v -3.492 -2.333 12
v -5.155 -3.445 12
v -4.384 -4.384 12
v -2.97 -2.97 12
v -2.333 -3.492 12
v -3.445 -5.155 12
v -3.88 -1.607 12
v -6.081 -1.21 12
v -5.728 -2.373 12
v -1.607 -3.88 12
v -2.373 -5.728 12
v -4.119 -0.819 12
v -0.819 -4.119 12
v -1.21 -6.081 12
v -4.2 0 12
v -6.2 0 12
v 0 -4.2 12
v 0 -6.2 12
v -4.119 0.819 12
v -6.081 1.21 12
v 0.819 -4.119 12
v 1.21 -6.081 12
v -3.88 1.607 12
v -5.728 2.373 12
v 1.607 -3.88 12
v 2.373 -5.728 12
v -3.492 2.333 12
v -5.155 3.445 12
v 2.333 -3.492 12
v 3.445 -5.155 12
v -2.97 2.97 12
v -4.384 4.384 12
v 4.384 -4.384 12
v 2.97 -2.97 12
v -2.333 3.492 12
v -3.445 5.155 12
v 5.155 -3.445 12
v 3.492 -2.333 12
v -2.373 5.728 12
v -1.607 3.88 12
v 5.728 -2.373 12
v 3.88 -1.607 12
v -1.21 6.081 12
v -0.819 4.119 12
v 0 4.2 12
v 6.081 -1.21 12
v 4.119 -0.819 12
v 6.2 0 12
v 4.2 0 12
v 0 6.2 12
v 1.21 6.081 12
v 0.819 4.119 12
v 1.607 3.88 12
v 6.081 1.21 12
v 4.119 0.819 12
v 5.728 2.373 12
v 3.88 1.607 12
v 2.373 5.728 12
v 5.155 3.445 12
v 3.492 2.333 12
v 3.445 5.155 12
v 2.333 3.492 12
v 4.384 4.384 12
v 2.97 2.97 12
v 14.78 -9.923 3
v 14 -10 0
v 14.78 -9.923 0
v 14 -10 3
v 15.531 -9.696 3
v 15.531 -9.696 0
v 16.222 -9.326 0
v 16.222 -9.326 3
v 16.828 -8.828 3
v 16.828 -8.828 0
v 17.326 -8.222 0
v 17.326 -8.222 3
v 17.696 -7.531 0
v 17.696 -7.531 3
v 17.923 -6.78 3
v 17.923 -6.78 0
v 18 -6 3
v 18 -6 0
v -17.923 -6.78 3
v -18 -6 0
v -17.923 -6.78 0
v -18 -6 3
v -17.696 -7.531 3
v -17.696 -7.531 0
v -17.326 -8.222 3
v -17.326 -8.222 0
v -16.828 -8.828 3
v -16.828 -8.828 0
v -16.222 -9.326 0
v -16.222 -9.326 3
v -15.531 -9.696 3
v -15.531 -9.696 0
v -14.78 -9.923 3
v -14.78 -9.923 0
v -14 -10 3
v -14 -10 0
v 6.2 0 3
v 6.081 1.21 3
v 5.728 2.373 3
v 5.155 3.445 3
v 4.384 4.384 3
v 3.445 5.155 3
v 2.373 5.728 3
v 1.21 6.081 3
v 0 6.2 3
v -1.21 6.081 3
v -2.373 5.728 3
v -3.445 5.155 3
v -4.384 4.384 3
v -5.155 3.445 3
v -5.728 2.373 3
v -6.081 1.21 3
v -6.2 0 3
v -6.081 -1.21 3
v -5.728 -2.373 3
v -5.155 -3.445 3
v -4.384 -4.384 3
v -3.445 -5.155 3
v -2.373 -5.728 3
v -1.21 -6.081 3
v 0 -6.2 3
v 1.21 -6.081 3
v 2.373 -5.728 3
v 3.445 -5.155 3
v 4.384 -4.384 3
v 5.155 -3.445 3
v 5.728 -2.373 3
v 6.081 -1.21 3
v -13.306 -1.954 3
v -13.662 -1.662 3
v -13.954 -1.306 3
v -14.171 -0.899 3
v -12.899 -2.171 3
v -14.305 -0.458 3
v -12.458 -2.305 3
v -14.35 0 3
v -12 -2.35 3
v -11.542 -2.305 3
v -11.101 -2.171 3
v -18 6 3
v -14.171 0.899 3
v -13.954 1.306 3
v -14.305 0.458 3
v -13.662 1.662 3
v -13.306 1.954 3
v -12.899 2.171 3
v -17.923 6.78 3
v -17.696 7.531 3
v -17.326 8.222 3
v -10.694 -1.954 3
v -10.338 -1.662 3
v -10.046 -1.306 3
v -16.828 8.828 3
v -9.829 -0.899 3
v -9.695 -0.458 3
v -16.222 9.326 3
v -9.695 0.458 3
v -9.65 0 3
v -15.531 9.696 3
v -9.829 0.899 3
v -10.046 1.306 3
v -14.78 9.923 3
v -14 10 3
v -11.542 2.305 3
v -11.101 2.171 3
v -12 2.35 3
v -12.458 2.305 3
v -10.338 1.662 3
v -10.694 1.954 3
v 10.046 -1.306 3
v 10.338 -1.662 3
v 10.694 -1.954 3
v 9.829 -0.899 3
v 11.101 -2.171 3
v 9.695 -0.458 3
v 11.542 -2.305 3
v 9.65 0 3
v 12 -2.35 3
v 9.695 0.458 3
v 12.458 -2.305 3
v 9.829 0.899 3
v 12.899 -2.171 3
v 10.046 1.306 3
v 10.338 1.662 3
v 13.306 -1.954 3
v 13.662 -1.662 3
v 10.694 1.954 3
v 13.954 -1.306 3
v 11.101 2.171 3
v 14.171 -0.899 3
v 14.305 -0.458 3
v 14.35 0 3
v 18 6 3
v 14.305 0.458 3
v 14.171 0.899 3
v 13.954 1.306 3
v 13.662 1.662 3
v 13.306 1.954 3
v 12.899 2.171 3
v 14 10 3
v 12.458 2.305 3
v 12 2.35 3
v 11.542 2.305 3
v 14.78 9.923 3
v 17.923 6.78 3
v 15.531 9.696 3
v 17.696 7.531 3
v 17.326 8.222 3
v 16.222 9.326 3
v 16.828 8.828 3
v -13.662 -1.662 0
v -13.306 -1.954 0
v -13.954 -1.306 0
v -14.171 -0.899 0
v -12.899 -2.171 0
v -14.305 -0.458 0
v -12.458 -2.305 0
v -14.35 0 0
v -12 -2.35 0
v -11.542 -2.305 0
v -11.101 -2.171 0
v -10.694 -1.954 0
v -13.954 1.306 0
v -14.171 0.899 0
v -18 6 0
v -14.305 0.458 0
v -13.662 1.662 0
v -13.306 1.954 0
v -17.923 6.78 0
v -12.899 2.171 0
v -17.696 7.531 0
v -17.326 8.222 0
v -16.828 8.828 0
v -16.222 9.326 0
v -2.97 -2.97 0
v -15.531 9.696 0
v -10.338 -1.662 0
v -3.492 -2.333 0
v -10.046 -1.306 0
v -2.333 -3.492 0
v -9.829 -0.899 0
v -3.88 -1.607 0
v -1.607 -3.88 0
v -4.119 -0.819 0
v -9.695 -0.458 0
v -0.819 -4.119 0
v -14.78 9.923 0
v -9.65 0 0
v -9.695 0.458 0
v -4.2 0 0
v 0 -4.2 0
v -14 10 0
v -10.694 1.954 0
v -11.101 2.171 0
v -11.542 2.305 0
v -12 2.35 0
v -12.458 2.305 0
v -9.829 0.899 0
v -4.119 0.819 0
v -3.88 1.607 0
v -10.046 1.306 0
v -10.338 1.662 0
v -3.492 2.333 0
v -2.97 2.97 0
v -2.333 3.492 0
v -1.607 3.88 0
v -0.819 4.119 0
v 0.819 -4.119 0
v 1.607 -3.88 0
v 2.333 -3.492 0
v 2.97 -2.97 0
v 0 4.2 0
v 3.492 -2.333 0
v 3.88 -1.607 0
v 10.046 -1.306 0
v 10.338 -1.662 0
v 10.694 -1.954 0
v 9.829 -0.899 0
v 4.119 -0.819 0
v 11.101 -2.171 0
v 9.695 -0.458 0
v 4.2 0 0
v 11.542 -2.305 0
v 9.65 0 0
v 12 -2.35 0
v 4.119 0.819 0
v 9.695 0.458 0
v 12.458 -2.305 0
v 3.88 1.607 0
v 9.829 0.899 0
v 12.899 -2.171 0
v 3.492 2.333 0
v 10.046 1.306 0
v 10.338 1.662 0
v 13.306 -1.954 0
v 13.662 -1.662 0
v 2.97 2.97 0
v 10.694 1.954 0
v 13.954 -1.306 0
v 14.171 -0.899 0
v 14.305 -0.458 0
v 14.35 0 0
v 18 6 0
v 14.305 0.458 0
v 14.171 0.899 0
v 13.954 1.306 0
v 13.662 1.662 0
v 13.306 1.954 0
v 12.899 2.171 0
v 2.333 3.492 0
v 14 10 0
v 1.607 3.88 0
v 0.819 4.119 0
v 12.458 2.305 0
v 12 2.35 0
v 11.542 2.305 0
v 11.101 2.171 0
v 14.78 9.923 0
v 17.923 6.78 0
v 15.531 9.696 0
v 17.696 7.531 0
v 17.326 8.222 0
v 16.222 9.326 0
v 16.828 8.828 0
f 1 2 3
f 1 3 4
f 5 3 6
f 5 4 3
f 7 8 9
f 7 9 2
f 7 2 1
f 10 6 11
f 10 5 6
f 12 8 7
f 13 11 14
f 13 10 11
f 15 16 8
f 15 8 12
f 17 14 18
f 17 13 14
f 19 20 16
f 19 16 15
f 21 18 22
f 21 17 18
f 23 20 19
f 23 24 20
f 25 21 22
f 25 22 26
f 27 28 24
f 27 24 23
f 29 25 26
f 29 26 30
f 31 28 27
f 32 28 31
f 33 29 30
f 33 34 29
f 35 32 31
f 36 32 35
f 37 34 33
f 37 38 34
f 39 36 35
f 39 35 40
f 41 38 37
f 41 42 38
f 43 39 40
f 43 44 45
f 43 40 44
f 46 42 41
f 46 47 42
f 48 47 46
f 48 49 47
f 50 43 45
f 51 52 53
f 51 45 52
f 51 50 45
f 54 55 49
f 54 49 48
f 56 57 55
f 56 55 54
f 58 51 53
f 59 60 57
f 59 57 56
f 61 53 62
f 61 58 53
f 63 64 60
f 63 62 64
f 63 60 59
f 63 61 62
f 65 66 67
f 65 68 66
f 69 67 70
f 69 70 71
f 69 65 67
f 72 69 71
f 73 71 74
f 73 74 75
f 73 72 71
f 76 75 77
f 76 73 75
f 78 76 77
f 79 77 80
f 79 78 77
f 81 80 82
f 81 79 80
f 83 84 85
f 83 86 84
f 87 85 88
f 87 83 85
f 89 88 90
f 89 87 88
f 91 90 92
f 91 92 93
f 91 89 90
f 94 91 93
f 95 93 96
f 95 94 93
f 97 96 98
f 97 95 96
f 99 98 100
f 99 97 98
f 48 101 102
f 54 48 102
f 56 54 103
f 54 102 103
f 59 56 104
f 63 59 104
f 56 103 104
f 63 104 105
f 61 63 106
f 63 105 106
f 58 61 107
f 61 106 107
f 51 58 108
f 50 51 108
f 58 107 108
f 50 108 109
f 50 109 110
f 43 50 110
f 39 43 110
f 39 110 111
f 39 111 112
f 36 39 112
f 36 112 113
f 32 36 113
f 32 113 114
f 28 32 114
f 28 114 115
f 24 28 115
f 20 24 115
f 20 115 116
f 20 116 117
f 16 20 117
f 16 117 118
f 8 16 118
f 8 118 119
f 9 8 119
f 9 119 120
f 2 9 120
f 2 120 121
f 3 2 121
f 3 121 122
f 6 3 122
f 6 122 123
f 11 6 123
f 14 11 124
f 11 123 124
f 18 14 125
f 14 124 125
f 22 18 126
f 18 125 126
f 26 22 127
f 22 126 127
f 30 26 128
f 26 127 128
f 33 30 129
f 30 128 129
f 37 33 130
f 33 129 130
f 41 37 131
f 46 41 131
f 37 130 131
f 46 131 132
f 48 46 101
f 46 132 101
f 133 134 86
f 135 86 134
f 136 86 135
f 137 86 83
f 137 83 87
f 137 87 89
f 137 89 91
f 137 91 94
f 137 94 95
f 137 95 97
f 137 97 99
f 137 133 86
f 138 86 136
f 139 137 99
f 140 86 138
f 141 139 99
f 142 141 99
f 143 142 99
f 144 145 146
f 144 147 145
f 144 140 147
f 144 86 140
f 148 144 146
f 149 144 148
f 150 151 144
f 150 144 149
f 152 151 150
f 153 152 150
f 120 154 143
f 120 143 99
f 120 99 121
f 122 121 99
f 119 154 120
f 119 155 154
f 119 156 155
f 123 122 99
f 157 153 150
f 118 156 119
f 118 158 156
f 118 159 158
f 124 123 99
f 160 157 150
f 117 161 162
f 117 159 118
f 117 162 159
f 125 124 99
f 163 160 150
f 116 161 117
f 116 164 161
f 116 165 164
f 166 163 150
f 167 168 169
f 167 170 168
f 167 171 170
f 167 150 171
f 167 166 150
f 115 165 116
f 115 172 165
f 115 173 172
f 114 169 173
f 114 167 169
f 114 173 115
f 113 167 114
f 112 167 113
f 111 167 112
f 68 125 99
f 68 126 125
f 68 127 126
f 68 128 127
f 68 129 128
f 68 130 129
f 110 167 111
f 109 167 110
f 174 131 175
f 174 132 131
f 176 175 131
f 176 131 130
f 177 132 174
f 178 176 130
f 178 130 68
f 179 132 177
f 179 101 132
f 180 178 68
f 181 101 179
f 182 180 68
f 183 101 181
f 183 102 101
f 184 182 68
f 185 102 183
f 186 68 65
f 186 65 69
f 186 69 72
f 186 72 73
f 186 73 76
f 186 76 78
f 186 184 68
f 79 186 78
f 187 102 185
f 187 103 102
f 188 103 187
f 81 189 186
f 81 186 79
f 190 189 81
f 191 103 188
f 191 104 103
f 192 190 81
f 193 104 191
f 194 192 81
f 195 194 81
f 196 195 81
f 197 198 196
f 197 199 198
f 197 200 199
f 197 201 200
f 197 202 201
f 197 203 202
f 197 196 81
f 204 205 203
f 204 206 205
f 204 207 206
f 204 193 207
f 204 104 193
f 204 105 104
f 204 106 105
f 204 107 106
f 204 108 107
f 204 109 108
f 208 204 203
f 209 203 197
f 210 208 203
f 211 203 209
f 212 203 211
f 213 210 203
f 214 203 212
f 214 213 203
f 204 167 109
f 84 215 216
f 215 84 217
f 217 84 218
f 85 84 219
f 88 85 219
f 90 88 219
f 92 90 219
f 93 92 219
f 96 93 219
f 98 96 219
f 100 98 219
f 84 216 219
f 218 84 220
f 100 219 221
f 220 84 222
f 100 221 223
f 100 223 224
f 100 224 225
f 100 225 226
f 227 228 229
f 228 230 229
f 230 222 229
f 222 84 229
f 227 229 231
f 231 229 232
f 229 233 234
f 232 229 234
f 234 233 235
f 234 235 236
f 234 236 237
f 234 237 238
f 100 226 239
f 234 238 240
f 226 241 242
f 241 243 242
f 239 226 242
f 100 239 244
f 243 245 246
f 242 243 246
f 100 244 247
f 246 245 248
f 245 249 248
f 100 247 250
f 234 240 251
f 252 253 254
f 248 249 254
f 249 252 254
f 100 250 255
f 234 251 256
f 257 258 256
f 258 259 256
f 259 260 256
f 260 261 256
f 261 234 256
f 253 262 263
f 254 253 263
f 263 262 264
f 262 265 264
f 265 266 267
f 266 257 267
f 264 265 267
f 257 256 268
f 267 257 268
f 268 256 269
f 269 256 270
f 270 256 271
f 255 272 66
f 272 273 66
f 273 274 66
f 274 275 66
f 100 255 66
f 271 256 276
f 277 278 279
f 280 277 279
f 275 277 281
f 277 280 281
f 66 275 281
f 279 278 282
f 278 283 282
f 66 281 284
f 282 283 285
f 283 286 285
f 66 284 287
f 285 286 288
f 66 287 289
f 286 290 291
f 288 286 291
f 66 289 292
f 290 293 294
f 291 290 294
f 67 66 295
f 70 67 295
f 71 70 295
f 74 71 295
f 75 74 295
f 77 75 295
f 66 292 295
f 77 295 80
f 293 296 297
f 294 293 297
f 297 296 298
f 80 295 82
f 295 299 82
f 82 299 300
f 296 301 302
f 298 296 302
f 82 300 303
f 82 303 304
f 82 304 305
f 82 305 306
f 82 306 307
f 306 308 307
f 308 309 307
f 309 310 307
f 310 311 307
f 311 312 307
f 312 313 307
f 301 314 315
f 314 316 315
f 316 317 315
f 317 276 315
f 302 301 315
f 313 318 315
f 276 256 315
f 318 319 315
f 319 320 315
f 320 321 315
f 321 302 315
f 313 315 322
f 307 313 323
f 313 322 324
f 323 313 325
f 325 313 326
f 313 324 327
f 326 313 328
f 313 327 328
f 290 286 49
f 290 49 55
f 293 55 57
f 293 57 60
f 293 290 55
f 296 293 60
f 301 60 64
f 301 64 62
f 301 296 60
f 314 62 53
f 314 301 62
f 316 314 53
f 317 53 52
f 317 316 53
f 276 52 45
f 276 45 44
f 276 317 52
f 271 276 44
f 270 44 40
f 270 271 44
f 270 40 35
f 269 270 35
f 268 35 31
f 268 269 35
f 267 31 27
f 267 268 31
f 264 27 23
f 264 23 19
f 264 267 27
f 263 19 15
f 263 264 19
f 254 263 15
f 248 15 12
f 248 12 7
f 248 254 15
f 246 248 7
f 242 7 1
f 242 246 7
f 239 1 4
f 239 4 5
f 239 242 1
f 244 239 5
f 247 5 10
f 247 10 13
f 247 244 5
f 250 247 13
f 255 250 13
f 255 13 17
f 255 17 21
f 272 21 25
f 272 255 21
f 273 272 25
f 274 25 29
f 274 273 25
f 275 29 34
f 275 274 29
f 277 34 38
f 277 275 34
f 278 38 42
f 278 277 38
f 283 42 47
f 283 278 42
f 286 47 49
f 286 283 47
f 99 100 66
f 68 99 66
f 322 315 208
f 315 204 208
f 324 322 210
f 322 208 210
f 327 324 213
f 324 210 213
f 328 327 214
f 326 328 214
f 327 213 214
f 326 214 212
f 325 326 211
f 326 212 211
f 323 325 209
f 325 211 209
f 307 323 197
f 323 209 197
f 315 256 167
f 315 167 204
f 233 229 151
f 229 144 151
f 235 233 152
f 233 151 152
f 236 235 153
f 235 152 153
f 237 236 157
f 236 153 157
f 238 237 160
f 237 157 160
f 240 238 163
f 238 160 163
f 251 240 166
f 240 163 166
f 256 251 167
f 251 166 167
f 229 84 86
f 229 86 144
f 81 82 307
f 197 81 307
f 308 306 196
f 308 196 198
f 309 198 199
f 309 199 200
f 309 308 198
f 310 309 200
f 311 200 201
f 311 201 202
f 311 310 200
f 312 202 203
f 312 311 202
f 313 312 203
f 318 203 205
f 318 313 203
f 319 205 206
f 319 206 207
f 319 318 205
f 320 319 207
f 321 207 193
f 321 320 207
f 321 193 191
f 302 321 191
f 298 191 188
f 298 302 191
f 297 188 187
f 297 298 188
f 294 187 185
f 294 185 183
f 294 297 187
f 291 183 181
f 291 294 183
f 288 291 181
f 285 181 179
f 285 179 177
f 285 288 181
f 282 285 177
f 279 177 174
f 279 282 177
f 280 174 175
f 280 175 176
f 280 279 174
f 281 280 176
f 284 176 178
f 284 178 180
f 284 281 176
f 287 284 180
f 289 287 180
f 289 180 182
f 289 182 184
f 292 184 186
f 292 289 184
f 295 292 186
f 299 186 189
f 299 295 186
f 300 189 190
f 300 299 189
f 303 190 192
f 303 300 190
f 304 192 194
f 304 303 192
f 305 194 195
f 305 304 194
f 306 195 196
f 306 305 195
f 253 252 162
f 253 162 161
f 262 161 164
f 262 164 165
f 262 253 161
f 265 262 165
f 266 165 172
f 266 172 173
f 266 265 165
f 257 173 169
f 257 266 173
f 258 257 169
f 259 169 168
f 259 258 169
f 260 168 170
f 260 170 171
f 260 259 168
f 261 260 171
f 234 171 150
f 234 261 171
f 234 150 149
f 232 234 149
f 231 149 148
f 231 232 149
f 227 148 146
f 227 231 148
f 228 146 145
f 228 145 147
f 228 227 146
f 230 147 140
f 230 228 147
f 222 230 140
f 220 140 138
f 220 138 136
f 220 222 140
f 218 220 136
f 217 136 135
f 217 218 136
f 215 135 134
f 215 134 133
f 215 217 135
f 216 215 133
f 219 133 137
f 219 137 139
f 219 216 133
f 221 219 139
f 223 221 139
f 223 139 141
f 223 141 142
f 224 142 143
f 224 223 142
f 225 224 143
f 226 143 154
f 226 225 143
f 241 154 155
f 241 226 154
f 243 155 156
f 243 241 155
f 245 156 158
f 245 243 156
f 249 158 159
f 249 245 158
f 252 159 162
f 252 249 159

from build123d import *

# Parameters (mm, degrees)
F0_W     = 36
F0_H     = 20
F0_R     = 2.35
F0_R_2   = 6.2
F1_DEPTH = 3
F0_R_3   = 4.2
F2_DEPTH = 12
F3_R     = 4


with BuildPart() as f1:
    # F0 (on Top) → F1 (new body)
    with BuildSketch(Plane.XY):
        Rectangle(F0_W, F0_H)
        with Locations((-12, 0)):
            Circle(F0_R, mode=Mode.SUBTRACT)
        Circle(F0_R_2, mode=Mode.SUBTRACT)
        with Locations((12, 0)):
            Circle(F0_R, mode=Mode.SUBTRACT)
    extrude(amount=F1_DEPTH)

    # F0 (on Top) → F2 (join)
    with BuildSketch(Plane.XY):
        Circle(F0_R_2)
        Circle(F0_R_3, mode=Mode.SUBTRACT)
    extrude(amount=F2_DEPTH)

    # F3
    f3_edges = [f1.edges().sort_by_distance(p)[0] for p in [
        (-18, 10, 1.5),
        (-18, -10, 1.5),
        (18, -10, 1.5),
        (18, 10, 1.5),
    ]]
    fillet(f3_edges, radius=F3_R)


solid = f1.part
